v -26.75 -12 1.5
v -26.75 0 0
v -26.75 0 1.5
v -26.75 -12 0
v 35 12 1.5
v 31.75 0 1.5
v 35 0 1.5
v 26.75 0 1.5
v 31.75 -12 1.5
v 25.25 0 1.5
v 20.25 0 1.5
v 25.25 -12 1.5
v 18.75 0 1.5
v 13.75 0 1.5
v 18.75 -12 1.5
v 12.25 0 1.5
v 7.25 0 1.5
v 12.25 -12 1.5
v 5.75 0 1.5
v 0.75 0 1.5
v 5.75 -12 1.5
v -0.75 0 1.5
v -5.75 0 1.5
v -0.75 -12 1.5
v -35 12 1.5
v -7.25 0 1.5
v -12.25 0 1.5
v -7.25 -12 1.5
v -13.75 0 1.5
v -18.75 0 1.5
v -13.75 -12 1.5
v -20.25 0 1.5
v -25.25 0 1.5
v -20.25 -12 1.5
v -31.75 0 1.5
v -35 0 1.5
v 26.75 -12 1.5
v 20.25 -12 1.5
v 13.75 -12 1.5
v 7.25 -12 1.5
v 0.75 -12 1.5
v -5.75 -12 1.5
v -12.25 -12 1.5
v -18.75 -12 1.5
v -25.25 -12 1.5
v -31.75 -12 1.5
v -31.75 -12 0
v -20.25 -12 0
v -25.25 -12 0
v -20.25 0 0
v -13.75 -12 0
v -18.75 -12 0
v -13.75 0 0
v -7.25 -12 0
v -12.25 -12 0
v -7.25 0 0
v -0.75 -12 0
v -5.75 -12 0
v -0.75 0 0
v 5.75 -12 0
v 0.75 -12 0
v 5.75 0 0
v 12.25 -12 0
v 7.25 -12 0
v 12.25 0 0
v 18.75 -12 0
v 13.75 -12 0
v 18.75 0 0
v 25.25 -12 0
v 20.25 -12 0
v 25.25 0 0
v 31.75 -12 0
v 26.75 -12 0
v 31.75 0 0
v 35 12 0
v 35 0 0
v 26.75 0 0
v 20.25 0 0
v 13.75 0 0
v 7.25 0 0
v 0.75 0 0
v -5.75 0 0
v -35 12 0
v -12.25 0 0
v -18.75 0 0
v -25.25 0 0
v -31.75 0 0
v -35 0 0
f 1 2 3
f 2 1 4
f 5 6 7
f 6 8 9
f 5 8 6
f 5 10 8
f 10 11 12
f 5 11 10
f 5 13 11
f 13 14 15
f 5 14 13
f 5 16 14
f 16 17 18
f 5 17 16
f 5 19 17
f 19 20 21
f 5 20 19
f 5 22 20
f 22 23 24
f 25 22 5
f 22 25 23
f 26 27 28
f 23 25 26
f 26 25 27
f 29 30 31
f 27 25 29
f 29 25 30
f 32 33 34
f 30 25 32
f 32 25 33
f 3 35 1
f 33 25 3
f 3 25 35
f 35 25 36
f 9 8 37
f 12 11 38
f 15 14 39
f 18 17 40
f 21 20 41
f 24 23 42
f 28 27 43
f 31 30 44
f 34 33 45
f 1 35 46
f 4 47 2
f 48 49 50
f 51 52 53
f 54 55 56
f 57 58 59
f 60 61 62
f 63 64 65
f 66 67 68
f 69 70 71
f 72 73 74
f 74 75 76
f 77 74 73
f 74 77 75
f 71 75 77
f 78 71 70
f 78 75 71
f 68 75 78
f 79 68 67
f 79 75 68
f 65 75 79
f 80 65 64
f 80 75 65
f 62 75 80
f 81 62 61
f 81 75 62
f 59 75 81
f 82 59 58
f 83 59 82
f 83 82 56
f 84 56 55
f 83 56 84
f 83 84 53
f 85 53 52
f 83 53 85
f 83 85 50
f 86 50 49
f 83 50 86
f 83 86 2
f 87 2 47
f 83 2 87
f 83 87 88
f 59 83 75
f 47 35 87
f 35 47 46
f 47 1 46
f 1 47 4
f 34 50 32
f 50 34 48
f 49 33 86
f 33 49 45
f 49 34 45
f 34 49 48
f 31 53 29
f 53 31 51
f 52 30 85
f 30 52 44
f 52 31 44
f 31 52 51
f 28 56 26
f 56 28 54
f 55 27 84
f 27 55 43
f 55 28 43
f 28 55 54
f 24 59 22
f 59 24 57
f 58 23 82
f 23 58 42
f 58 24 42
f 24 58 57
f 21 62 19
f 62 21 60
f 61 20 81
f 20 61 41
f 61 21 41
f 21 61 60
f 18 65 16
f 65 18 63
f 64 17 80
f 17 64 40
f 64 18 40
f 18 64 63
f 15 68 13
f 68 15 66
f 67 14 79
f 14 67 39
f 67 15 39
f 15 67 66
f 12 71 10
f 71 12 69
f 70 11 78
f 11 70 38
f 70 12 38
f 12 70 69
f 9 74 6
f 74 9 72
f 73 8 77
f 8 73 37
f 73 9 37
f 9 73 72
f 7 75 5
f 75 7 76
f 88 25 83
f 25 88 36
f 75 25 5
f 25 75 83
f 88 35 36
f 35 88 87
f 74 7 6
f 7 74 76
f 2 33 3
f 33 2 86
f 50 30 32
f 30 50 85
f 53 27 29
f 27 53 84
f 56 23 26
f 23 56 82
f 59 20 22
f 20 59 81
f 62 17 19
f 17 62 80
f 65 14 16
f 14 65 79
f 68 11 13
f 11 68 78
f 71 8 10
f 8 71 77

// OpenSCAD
// 10-well agarose gel comb - printed flat on the bed
// Units: mm

$fn = 64;

// ---- Parameters ----
plate_t     = 1.5;   // plate thickness (Z)
spine_len   = 70;    // spine length (X)
spine_w     = 12;    // spine width (Y)
n_teeth     = 10;    // number of teeth / wells
tooth_w     = 5.0;   // tooth width (X)
tooth_len   = 12;    // tooth length (Y), hanging in -Y
tooth_gap   = 1.5;   // gap between neighbouring teeth (X)
overlap     = 0.01;  // small overlap so teeth fuse into spine

// ---- Derived ----
total_y     = spine_w + tooth_len;                          // overall Y extent
row_w       = n_teeth * tooth_w + (n_teeth - 1) * tooth_gap; // teeth row width
spine_y0    = -total_y / 2 + tooth_len;                     // spine bottom edge (Y)
teeth_y0    = -total_y / 2;                                 // teeth tip edge (Y)
pitch       = tooth_w + tooth_gap;                          // tooth centre spacing

// ---- Model ----
union() {
    // Spine (back bar)
    translate([-spine_len / 2, spine_y0, 0])
        cube([spine_len, spine_w, plate_t]);

    // Teeth
    for (i = [0 : n_teeth - 1])
        translate([-row_w / 2 + i * pitch, teeth_y0, 0])
            cube([tooth_w, tooth_len + overlap, plate_t]);
}
